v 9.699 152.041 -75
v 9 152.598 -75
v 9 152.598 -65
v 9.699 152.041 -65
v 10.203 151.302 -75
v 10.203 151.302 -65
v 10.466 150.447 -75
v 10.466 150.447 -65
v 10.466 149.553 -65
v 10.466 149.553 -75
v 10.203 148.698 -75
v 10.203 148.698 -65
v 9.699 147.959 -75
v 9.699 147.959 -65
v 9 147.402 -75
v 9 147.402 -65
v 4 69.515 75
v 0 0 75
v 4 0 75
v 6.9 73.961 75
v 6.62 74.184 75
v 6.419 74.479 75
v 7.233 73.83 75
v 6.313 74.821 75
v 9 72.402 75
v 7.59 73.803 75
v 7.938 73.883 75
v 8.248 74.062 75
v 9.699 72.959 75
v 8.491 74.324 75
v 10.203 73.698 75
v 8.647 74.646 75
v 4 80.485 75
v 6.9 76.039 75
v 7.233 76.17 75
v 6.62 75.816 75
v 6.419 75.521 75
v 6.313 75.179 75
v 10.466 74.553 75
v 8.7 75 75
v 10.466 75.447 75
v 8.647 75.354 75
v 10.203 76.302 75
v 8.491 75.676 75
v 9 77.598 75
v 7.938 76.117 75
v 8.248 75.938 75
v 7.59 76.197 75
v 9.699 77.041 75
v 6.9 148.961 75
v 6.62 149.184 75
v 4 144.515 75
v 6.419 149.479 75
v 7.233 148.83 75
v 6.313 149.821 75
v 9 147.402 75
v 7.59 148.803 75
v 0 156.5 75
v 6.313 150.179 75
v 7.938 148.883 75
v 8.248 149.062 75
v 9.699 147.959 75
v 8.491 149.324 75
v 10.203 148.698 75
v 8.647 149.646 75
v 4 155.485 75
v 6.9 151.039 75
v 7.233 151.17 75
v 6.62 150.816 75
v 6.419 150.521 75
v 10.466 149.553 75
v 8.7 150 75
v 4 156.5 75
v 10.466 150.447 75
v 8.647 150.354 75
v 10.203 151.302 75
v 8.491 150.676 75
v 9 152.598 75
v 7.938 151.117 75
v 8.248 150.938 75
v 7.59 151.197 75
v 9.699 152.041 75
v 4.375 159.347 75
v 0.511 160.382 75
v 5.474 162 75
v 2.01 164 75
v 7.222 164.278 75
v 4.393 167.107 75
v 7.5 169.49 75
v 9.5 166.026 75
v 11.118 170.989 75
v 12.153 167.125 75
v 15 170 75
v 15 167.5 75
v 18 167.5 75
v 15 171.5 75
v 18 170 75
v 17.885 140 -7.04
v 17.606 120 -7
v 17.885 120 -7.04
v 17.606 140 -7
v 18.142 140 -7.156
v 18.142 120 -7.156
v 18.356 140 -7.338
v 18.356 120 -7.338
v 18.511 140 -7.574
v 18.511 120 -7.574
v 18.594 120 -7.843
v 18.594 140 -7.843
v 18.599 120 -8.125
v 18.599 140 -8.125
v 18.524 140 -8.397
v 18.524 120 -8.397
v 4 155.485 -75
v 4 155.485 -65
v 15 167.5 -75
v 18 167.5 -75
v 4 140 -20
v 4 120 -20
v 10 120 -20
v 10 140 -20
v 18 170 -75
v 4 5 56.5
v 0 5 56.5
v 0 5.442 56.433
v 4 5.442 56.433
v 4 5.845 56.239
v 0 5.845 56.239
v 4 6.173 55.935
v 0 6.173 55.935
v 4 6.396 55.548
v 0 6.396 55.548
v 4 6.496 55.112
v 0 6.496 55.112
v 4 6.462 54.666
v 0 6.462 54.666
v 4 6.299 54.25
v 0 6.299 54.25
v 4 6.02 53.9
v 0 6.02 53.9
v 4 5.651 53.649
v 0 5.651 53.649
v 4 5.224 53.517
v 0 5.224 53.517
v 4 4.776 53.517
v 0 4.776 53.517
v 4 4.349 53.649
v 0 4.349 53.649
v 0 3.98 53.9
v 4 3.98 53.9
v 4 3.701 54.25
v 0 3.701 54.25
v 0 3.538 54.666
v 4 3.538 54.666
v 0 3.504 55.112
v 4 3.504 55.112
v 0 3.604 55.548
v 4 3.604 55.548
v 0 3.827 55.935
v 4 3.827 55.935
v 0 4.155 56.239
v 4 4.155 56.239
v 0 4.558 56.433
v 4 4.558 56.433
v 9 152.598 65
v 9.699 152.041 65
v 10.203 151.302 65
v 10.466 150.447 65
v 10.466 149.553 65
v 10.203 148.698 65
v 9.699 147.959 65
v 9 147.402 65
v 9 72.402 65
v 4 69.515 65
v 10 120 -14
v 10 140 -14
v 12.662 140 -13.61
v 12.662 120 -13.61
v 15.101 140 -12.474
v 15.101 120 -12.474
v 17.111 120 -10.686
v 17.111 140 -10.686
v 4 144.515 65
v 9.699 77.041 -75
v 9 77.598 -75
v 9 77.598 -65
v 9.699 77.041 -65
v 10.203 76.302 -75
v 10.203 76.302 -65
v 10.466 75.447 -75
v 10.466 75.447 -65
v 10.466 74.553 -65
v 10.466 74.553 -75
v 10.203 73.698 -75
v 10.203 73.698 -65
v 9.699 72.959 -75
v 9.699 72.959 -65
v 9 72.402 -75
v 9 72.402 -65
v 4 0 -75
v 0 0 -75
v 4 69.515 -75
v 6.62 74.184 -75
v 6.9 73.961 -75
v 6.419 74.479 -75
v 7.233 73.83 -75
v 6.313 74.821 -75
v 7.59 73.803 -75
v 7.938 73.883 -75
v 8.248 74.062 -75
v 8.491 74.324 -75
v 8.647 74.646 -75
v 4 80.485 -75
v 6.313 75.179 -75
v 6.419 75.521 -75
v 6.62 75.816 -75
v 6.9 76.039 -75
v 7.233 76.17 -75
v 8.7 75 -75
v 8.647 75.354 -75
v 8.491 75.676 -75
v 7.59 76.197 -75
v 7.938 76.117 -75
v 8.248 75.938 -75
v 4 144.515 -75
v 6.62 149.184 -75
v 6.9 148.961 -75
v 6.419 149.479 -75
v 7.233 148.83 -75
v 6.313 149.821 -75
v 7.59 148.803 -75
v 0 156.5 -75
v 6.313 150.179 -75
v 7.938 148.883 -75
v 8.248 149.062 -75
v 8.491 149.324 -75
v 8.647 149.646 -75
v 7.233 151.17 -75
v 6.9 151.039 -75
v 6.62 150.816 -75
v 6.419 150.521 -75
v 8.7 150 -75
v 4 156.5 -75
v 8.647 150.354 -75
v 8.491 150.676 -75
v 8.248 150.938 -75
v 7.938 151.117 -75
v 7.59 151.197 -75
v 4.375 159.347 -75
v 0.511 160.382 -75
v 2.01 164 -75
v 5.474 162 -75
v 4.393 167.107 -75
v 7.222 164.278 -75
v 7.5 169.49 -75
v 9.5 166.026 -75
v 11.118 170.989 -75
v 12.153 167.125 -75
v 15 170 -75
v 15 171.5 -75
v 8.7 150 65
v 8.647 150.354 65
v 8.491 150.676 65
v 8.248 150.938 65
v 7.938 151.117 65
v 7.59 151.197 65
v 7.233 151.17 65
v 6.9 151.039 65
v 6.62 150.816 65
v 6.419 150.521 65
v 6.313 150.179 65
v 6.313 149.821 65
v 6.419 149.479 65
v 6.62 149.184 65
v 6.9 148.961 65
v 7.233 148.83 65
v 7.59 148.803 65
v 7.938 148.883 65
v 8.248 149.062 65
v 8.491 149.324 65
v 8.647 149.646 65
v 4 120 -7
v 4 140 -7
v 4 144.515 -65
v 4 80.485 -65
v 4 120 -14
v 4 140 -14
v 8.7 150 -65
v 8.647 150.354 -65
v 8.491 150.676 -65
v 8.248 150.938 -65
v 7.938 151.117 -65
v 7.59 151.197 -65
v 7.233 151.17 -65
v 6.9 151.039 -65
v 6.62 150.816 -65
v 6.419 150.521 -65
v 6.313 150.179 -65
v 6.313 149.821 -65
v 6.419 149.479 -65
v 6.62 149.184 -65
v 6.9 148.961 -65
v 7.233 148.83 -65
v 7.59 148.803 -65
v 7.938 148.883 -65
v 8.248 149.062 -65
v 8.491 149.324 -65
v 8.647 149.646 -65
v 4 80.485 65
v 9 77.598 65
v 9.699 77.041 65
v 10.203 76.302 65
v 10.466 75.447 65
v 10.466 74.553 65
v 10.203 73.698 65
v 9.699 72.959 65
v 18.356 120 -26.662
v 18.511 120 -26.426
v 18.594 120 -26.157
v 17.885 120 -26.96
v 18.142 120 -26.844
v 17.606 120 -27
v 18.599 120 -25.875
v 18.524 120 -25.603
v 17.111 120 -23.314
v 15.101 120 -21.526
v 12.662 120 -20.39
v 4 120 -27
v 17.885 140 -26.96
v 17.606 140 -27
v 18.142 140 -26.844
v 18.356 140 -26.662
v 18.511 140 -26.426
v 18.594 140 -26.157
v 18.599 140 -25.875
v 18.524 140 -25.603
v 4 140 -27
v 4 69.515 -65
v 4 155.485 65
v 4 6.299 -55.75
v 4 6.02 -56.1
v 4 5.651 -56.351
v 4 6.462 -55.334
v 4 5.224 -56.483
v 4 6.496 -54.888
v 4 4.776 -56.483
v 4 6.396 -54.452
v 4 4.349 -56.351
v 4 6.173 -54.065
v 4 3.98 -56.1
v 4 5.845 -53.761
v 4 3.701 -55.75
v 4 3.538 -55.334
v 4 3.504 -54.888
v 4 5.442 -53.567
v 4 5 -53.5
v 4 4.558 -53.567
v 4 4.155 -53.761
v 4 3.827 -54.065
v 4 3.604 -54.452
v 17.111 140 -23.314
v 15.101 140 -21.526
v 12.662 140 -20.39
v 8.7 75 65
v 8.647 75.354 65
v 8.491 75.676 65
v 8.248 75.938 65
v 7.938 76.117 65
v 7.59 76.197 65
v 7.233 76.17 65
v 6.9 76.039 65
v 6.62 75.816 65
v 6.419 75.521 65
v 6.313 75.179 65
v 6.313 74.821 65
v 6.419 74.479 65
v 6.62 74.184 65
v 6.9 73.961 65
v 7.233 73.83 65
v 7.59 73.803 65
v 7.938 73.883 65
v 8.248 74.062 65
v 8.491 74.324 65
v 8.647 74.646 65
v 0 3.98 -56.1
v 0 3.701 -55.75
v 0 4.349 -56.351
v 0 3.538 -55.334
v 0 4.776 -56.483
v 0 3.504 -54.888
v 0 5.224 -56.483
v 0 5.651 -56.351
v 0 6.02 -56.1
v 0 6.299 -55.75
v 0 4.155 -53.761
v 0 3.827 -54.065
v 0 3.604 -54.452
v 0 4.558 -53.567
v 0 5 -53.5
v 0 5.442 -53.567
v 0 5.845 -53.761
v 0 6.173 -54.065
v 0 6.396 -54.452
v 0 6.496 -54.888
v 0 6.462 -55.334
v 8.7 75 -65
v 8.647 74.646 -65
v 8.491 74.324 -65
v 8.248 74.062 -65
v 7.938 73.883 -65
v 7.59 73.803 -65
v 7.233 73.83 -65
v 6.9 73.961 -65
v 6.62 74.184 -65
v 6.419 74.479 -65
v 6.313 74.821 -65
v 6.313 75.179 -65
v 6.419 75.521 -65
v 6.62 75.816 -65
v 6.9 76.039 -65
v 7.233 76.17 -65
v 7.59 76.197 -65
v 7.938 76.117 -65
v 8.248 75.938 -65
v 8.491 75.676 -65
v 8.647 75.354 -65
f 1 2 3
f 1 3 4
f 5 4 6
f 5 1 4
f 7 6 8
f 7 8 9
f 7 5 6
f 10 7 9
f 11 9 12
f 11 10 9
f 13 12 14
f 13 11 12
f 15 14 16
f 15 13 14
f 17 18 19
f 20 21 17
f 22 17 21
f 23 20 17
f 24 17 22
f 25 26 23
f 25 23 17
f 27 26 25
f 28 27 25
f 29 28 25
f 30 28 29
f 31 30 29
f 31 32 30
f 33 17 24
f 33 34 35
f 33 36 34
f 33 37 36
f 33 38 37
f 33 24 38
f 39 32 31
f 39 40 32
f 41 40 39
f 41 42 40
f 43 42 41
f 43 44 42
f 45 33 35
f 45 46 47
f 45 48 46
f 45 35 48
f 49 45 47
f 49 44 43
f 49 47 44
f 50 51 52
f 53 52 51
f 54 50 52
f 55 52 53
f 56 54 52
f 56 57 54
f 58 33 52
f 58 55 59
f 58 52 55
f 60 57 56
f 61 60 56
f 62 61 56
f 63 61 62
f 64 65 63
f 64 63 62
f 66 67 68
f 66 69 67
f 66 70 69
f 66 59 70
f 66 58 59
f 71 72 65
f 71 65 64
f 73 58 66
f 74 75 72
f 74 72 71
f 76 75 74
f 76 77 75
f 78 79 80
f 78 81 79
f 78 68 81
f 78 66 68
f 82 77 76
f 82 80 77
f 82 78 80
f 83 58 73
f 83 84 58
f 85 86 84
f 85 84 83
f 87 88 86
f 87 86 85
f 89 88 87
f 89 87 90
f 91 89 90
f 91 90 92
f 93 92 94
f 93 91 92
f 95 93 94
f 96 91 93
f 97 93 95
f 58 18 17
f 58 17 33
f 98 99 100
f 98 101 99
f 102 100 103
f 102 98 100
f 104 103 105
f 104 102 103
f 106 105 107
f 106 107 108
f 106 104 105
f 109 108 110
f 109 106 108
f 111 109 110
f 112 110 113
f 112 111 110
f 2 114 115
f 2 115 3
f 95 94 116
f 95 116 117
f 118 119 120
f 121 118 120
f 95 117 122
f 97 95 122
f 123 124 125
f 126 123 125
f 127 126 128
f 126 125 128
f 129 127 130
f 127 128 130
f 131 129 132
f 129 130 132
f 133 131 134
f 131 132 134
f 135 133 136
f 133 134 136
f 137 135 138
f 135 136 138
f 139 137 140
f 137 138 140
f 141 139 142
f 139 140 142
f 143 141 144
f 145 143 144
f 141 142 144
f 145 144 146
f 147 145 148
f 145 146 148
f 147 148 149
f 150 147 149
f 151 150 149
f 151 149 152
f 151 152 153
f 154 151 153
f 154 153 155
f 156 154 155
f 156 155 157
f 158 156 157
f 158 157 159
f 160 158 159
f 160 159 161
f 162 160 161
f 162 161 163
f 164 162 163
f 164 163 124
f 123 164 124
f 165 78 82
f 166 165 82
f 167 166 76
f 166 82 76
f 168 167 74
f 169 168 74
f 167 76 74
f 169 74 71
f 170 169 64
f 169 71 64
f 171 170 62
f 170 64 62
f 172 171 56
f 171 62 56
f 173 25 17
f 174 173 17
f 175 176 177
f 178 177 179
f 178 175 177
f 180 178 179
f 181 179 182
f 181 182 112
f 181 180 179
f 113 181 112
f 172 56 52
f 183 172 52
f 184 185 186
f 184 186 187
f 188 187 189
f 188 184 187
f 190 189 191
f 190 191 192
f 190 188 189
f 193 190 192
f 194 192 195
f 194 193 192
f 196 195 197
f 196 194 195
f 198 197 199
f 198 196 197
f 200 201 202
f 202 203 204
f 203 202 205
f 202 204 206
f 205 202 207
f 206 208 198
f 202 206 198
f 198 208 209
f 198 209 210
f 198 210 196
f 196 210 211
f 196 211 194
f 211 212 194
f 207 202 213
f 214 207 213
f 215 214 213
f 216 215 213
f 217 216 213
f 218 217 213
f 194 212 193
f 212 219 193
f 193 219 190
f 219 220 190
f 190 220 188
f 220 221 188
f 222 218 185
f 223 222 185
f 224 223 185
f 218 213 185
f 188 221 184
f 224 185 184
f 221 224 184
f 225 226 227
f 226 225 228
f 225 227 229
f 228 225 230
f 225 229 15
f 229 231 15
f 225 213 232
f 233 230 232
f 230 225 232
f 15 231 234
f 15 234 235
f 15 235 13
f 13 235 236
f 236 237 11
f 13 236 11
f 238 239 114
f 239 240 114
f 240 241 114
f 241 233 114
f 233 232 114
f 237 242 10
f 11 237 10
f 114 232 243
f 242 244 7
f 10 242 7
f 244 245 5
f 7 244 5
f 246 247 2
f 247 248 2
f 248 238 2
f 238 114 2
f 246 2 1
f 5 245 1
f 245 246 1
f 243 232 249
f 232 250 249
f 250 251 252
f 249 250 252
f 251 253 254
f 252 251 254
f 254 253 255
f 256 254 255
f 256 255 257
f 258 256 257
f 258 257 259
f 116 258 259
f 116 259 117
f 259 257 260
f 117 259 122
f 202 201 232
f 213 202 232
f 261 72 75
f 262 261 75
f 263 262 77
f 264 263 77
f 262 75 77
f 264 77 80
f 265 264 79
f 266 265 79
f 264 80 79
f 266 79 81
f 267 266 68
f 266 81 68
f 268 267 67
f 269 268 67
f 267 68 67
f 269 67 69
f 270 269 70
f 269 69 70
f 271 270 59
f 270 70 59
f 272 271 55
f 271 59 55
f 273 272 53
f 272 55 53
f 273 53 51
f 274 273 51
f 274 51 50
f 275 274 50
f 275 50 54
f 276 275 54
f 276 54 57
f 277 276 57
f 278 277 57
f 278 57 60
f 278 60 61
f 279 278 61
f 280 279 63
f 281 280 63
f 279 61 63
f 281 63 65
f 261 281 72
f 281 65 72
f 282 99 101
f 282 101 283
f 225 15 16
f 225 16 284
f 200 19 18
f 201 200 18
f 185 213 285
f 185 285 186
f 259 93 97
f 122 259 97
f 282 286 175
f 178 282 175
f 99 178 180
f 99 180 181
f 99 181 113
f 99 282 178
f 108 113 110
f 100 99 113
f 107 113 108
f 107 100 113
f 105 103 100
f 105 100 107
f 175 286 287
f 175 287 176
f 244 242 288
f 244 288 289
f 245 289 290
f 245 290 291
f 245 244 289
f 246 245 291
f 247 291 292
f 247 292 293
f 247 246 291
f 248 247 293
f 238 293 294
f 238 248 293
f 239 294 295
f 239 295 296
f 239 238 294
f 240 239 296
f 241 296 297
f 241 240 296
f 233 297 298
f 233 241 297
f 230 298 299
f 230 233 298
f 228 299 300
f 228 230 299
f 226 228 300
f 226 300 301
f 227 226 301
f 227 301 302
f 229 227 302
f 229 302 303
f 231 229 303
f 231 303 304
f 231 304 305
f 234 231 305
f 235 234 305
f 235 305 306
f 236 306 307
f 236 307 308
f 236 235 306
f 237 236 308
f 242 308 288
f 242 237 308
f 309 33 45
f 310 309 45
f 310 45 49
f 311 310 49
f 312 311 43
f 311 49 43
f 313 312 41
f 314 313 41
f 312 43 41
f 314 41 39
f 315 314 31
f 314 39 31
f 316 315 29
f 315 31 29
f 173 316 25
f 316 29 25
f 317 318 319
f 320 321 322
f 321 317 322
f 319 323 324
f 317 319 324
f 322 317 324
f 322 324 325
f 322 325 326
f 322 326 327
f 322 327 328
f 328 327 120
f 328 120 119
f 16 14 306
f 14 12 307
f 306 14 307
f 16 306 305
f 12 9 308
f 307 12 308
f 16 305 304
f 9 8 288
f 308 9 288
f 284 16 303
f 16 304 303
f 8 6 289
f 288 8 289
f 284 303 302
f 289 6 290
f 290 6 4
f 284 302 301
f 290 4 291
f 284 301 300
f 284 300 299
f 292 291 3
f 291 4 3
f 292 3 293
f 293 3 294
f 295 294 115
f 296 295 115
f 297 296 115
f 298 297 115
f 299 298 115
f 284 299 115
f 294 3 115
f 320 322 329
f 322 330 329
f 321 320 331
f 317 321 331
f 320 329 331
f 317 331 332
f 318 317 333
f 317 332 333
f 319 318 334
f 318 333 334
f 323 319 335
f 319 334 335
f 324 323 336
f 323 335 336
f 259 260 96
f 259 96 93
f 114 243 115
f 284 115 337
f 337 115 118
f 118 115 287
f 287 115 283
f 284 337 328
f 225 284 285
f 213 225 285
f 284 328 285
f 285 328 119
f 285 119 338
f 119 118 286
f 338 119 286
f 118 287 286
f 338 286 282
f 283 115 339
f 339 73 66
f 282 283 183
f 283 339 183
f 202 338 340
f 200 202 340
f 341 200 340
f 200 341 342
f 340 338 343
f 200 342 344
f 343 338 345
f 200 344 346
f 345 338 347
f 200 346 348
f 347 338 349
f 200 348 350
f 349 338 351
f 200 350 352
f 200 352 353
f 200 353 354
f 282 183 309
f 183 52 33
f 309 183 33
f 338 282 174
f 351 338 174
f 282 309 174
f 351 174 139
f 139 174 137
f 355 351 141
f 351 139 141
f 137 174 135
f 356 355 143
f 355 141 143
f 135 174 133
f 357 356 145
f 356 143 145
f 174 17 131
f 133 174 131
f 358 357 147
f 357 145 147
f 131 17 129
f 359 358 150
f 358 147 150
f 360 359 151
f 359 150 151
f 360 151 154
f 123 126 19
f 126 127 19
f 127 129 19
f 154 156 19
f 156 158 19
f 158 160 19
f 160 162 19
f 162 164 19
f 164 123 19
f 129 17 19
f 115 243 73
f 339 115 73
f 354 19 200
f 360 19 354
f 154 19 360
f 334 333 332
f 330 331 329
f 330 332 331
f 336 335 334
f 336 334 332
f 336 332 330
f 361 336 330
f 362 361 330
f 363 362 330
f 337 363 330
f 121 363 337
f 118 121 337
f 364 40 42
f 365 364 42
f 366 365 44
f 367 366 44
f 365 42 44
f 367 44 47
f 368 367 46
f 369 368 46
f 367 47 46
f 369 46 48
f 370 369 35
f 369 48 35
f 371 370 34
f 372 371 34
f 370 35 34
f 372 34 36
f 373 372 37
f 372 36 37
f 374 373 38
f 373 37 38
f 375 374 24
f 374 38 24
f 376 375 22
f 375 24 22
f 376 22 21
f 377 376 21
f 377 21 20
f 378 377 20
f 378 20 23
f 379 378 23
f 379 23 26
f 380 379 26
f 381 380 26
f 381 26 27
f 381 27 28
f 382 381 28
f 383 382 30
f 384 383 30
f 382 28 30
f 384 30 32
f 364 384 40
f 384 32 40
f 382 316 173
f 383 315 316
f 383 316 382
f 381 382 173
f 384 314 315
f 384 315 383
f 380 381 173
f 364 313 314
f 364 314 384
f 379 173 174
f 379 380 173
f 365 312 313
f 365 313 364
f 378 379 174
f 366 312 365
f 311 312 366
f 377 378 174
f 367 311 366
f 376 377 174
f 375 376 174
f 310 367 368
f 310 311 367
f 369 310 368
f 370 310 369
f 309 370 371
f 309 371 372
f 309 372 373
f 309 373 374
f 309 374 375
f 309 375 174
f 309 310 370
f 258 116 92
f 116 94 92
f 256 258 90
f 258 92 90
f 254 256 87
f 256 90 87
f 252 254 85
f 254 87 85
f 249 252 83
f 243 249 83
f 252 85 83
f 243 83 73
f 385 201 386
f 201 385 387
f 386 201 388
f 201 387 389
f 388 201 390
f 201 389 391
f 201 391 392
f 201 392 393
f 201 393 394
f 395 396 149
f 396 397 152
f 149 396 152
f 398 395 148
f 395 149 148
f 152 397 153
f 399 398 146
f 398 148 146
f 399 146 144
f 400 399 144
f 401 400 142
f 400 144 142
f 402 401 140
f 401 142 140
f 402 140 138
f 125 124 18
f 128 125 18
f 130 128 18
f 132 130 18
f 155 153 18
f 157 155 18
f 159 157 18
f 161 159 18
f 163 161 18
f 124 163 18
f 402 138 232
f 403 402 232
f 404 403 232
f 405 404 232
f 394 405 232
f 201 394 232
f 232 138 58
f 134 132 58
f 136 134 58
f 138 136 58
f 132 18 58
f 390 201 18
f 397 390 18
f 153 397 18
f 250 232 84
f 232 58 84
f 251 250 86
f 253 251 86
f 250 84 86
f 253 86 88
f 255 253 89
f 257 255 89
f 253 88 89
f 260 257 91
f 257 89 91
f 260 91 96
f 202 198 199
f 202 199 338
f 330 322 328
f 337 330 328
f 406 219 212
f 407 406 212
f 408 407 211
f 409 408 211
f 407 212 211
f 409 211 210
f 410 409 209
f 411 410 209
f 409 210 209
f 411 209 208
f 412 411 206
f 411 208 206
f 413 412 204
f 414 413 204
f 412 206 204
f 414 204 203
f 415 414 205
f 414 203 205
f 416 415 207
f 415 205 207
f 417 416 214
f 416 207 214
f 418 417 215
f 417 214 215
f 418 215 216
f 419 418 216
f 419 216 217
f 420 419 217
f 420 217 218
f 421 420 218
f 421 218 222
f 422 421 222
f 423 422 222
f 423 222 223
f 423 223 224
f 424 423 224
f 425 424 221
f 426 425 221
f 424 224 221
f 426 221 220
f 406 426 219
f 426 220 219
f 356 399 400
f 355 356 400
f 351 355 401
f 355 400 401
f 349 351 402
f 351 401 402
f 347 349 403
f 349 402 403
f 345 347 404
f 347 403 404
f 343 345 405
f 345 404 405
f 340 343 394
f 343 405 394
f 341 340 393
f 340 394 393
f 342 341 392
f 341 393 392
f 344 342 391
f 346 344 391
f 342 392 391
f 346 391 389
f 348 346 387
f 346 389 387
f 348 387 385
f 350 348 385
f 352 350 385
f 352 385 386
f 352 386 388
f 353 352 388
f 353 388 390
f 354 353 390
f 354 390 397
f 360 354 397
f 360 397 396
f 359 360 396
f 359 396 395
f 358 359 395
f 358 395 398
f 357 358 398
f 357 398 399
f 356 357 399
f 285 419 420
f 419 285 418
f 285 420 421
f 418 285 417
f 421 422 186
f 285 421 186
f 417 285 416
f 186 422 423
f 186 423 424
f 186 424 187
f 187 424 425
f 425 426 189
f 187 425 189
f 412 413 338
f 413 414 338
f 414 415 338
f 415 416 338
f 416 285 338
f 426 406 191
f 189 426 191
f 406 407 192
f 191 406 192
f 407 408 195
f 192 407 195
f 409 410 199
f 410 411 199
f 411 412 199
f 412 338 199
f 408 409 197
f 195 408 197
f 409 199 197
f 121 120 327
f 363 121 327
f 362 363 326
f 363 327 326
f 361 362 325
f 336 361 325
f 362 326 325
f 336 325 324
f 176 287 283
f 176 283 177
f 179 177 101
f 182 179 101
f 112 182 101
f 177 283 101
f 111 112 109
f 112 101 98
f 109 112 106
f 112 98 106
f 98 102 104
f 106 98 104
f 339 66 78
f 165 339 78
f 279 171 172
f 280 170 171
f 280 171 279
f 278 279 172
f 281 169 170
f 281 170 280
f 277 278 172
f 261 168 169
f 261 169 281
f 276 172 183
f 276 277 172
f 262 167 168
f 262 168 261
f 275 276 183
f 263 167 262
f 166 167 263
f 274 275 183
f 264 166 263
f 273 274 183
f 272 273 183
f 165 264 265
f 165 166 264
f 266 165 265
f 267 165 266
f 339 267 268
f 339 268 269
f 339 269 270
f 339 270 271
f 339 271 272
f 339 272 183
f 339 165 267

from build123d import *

# Parameters (mm, degrees)
EXTRU_MINCE1_DEPTH                   = 75
ESQUISSE2_R                          = 1.5
ENL_V_MAT_EXTRU_1_DEPTH              = 188.782453919
ESQUISSE3_W                          = 3
ESQUISSE3_H                          = 2.5
BOSS_EXTRU_1_DEPTH                   = 150
ESQUISSE4_R                          = 1.2
BOSS_EXTRU_2_DEPTH                   = 10
R_P_TITION_LIN_AIRE1_COUNT           = 2
R_P_TITION_LIN_AIRE1_PITCH           = 75
R_P_TITION_LIN_AIRE1_COPY_1_SKETCH_R = 1.2
R_P_TITION_LIN_AIRE1_COPY_1_DEPTH    = 10
BOSS_EXTRU_3_START                   = -120
BOSS_EXTRU_3_DEPTH                   = 20
CONG_1_R                             = 1


with BuildPart() as part:
    # Esquisse1 → Extru.-Mince1 (new, symmetric)
    with BuildSketch(Plane.XY):
        with BuildLine():
            Line((0, 0), (0, 156.5))
            ThreePointArc((0, 156.5), (4.393398282, 167.106601718), (15, 171.5))
            Line((15, 171.5), (15, 167.5))
            ThreePointArc((15, 167.5), (7.221825407, 164.278174593), (4, 156.5))
            Line((4, 156.5), (4, 0))
            Line((4, 0), (0, 0))
        make_face()
    extrude(amount=EXTRU_MINCE1_DEPTH, both=True)

    # Esquisse2 → Enlèv. mat.-Extru.1 (cut, through all)
    with BuildSketch(Plane.ZY):
        with Locations((-55, 5)):
            Circle(ESQUISSE2_R)
        with Locations((55, 5)):
            Circle(ESQUISSE2_R)
    extrude(amount=-ENL_V_MAT_EXTRU_1_DEPTH, mode=Mode.SUBTRACT)

    # Esquisse3 → Boss.-Extru.1 (add)
    with BuildSketch(Plane.XY.offset(75)):
        with Locations((16.5, 168.75)):
            Rectangle(ESQUISSE3_W, ESQUISSE3_H)
    extrude(amount=-BOSS_EXTRU_1_DEPTH)

    # Esquisse4 → Boss.-Extru.2 (add)
    with BuildSketch(Plane.XY.offset(75)):
        with BuildLine():
            Line((4, 155.484827557), (9, 152.598076211))
            ThreePointArc((9, 152.598076211), (10.5, 150), (9, 147.401923789))
            Line((9, 147.401923789), (4, 144.515172443))
            Line((4, 144.515172443), (4, 155.484827557))
        make_face()
        with Locations((7.5, 150)):
            Circle(ESQUISSE4_R, mode=Mode.SUBTRACT)
    boss_extru_2 = extrude(amount=-BOSS_EXTRU_2_DEPTH)

    # Symétrie1: Boss.-Extru.2 across plane
    add(boss_extru_2.mirror(Plane.XY))

    # Répétition linéaire1: Boss.-Extru.2 ×2
    with Locations(*[(0, -i * R_P_TITION_LIN_AIRE1_PITCH, 0) for i in range(1, R_P_TITION_LIN_AIRE1_COUNT)]):
        add(boss_extru_2)

    # Répétition linéaire1 copy 1 sketch → Répétition linéaire1 copy 1 (add)
    with BuildSketch(Plane(origin=(0, -75, -75), x_dir=(1, 0, 0), z_dir=(0, 0, -1))):
        with BuildLine():
            Line((4, -155.484827557), (9, -152.598076211))
            ThreePointArc((9, -152.598076211), (10.5, -150), (9, -147.401923789))
            Line((9, -147.401923789), (4, -144.515172443))
            Line((4, -144.515172443), (4, -155.484827557))
        make_face()
        with Locations((7.5, -150)):
            Circle(R_P_TITION_LIN_AIRE1_COPY_1_SKETCH_R, mode=Mode.SUBTRACT)
    extrude(amount=-R_P_TITION_LIN_AIRE1_COPY_1_DEPTH)

    # Esquisse5 → Boss.-Extru.3 (add)
    with BuildSketch(Plane.XZ.offset(BOSS_EXTRU_3_START)):
        with BuildLine():
            Line((4, -14), (10, -14))
            ThreePointArc((10, -14), (15.700877125, -12.043984876), (19, -7))
            Line((19, -7), (4, -7))
            Line((4, -7), (4, -14))
        make_face()
        with BuildLine():
            Line((4, -27), (4, -20))
            Line((4, -20), (10, -20))
            ThreePointArc((10, -20), (15.700877125, -21.956015124), (19, -27))
            Line((19, -27), (4, -27))
        make_face()
    extrude(amount=-BOSS_EXTRU_3_DEPTH)

    # Congé1
    cong_1_edges = [part.edges().sort_by_distance(p)[0] for p in [
        (19, 130, -7),
        (19, 130, -27),
    ]]
    fillet(cong_1_edges, radius=CONG_1_R)


solid = part.part
